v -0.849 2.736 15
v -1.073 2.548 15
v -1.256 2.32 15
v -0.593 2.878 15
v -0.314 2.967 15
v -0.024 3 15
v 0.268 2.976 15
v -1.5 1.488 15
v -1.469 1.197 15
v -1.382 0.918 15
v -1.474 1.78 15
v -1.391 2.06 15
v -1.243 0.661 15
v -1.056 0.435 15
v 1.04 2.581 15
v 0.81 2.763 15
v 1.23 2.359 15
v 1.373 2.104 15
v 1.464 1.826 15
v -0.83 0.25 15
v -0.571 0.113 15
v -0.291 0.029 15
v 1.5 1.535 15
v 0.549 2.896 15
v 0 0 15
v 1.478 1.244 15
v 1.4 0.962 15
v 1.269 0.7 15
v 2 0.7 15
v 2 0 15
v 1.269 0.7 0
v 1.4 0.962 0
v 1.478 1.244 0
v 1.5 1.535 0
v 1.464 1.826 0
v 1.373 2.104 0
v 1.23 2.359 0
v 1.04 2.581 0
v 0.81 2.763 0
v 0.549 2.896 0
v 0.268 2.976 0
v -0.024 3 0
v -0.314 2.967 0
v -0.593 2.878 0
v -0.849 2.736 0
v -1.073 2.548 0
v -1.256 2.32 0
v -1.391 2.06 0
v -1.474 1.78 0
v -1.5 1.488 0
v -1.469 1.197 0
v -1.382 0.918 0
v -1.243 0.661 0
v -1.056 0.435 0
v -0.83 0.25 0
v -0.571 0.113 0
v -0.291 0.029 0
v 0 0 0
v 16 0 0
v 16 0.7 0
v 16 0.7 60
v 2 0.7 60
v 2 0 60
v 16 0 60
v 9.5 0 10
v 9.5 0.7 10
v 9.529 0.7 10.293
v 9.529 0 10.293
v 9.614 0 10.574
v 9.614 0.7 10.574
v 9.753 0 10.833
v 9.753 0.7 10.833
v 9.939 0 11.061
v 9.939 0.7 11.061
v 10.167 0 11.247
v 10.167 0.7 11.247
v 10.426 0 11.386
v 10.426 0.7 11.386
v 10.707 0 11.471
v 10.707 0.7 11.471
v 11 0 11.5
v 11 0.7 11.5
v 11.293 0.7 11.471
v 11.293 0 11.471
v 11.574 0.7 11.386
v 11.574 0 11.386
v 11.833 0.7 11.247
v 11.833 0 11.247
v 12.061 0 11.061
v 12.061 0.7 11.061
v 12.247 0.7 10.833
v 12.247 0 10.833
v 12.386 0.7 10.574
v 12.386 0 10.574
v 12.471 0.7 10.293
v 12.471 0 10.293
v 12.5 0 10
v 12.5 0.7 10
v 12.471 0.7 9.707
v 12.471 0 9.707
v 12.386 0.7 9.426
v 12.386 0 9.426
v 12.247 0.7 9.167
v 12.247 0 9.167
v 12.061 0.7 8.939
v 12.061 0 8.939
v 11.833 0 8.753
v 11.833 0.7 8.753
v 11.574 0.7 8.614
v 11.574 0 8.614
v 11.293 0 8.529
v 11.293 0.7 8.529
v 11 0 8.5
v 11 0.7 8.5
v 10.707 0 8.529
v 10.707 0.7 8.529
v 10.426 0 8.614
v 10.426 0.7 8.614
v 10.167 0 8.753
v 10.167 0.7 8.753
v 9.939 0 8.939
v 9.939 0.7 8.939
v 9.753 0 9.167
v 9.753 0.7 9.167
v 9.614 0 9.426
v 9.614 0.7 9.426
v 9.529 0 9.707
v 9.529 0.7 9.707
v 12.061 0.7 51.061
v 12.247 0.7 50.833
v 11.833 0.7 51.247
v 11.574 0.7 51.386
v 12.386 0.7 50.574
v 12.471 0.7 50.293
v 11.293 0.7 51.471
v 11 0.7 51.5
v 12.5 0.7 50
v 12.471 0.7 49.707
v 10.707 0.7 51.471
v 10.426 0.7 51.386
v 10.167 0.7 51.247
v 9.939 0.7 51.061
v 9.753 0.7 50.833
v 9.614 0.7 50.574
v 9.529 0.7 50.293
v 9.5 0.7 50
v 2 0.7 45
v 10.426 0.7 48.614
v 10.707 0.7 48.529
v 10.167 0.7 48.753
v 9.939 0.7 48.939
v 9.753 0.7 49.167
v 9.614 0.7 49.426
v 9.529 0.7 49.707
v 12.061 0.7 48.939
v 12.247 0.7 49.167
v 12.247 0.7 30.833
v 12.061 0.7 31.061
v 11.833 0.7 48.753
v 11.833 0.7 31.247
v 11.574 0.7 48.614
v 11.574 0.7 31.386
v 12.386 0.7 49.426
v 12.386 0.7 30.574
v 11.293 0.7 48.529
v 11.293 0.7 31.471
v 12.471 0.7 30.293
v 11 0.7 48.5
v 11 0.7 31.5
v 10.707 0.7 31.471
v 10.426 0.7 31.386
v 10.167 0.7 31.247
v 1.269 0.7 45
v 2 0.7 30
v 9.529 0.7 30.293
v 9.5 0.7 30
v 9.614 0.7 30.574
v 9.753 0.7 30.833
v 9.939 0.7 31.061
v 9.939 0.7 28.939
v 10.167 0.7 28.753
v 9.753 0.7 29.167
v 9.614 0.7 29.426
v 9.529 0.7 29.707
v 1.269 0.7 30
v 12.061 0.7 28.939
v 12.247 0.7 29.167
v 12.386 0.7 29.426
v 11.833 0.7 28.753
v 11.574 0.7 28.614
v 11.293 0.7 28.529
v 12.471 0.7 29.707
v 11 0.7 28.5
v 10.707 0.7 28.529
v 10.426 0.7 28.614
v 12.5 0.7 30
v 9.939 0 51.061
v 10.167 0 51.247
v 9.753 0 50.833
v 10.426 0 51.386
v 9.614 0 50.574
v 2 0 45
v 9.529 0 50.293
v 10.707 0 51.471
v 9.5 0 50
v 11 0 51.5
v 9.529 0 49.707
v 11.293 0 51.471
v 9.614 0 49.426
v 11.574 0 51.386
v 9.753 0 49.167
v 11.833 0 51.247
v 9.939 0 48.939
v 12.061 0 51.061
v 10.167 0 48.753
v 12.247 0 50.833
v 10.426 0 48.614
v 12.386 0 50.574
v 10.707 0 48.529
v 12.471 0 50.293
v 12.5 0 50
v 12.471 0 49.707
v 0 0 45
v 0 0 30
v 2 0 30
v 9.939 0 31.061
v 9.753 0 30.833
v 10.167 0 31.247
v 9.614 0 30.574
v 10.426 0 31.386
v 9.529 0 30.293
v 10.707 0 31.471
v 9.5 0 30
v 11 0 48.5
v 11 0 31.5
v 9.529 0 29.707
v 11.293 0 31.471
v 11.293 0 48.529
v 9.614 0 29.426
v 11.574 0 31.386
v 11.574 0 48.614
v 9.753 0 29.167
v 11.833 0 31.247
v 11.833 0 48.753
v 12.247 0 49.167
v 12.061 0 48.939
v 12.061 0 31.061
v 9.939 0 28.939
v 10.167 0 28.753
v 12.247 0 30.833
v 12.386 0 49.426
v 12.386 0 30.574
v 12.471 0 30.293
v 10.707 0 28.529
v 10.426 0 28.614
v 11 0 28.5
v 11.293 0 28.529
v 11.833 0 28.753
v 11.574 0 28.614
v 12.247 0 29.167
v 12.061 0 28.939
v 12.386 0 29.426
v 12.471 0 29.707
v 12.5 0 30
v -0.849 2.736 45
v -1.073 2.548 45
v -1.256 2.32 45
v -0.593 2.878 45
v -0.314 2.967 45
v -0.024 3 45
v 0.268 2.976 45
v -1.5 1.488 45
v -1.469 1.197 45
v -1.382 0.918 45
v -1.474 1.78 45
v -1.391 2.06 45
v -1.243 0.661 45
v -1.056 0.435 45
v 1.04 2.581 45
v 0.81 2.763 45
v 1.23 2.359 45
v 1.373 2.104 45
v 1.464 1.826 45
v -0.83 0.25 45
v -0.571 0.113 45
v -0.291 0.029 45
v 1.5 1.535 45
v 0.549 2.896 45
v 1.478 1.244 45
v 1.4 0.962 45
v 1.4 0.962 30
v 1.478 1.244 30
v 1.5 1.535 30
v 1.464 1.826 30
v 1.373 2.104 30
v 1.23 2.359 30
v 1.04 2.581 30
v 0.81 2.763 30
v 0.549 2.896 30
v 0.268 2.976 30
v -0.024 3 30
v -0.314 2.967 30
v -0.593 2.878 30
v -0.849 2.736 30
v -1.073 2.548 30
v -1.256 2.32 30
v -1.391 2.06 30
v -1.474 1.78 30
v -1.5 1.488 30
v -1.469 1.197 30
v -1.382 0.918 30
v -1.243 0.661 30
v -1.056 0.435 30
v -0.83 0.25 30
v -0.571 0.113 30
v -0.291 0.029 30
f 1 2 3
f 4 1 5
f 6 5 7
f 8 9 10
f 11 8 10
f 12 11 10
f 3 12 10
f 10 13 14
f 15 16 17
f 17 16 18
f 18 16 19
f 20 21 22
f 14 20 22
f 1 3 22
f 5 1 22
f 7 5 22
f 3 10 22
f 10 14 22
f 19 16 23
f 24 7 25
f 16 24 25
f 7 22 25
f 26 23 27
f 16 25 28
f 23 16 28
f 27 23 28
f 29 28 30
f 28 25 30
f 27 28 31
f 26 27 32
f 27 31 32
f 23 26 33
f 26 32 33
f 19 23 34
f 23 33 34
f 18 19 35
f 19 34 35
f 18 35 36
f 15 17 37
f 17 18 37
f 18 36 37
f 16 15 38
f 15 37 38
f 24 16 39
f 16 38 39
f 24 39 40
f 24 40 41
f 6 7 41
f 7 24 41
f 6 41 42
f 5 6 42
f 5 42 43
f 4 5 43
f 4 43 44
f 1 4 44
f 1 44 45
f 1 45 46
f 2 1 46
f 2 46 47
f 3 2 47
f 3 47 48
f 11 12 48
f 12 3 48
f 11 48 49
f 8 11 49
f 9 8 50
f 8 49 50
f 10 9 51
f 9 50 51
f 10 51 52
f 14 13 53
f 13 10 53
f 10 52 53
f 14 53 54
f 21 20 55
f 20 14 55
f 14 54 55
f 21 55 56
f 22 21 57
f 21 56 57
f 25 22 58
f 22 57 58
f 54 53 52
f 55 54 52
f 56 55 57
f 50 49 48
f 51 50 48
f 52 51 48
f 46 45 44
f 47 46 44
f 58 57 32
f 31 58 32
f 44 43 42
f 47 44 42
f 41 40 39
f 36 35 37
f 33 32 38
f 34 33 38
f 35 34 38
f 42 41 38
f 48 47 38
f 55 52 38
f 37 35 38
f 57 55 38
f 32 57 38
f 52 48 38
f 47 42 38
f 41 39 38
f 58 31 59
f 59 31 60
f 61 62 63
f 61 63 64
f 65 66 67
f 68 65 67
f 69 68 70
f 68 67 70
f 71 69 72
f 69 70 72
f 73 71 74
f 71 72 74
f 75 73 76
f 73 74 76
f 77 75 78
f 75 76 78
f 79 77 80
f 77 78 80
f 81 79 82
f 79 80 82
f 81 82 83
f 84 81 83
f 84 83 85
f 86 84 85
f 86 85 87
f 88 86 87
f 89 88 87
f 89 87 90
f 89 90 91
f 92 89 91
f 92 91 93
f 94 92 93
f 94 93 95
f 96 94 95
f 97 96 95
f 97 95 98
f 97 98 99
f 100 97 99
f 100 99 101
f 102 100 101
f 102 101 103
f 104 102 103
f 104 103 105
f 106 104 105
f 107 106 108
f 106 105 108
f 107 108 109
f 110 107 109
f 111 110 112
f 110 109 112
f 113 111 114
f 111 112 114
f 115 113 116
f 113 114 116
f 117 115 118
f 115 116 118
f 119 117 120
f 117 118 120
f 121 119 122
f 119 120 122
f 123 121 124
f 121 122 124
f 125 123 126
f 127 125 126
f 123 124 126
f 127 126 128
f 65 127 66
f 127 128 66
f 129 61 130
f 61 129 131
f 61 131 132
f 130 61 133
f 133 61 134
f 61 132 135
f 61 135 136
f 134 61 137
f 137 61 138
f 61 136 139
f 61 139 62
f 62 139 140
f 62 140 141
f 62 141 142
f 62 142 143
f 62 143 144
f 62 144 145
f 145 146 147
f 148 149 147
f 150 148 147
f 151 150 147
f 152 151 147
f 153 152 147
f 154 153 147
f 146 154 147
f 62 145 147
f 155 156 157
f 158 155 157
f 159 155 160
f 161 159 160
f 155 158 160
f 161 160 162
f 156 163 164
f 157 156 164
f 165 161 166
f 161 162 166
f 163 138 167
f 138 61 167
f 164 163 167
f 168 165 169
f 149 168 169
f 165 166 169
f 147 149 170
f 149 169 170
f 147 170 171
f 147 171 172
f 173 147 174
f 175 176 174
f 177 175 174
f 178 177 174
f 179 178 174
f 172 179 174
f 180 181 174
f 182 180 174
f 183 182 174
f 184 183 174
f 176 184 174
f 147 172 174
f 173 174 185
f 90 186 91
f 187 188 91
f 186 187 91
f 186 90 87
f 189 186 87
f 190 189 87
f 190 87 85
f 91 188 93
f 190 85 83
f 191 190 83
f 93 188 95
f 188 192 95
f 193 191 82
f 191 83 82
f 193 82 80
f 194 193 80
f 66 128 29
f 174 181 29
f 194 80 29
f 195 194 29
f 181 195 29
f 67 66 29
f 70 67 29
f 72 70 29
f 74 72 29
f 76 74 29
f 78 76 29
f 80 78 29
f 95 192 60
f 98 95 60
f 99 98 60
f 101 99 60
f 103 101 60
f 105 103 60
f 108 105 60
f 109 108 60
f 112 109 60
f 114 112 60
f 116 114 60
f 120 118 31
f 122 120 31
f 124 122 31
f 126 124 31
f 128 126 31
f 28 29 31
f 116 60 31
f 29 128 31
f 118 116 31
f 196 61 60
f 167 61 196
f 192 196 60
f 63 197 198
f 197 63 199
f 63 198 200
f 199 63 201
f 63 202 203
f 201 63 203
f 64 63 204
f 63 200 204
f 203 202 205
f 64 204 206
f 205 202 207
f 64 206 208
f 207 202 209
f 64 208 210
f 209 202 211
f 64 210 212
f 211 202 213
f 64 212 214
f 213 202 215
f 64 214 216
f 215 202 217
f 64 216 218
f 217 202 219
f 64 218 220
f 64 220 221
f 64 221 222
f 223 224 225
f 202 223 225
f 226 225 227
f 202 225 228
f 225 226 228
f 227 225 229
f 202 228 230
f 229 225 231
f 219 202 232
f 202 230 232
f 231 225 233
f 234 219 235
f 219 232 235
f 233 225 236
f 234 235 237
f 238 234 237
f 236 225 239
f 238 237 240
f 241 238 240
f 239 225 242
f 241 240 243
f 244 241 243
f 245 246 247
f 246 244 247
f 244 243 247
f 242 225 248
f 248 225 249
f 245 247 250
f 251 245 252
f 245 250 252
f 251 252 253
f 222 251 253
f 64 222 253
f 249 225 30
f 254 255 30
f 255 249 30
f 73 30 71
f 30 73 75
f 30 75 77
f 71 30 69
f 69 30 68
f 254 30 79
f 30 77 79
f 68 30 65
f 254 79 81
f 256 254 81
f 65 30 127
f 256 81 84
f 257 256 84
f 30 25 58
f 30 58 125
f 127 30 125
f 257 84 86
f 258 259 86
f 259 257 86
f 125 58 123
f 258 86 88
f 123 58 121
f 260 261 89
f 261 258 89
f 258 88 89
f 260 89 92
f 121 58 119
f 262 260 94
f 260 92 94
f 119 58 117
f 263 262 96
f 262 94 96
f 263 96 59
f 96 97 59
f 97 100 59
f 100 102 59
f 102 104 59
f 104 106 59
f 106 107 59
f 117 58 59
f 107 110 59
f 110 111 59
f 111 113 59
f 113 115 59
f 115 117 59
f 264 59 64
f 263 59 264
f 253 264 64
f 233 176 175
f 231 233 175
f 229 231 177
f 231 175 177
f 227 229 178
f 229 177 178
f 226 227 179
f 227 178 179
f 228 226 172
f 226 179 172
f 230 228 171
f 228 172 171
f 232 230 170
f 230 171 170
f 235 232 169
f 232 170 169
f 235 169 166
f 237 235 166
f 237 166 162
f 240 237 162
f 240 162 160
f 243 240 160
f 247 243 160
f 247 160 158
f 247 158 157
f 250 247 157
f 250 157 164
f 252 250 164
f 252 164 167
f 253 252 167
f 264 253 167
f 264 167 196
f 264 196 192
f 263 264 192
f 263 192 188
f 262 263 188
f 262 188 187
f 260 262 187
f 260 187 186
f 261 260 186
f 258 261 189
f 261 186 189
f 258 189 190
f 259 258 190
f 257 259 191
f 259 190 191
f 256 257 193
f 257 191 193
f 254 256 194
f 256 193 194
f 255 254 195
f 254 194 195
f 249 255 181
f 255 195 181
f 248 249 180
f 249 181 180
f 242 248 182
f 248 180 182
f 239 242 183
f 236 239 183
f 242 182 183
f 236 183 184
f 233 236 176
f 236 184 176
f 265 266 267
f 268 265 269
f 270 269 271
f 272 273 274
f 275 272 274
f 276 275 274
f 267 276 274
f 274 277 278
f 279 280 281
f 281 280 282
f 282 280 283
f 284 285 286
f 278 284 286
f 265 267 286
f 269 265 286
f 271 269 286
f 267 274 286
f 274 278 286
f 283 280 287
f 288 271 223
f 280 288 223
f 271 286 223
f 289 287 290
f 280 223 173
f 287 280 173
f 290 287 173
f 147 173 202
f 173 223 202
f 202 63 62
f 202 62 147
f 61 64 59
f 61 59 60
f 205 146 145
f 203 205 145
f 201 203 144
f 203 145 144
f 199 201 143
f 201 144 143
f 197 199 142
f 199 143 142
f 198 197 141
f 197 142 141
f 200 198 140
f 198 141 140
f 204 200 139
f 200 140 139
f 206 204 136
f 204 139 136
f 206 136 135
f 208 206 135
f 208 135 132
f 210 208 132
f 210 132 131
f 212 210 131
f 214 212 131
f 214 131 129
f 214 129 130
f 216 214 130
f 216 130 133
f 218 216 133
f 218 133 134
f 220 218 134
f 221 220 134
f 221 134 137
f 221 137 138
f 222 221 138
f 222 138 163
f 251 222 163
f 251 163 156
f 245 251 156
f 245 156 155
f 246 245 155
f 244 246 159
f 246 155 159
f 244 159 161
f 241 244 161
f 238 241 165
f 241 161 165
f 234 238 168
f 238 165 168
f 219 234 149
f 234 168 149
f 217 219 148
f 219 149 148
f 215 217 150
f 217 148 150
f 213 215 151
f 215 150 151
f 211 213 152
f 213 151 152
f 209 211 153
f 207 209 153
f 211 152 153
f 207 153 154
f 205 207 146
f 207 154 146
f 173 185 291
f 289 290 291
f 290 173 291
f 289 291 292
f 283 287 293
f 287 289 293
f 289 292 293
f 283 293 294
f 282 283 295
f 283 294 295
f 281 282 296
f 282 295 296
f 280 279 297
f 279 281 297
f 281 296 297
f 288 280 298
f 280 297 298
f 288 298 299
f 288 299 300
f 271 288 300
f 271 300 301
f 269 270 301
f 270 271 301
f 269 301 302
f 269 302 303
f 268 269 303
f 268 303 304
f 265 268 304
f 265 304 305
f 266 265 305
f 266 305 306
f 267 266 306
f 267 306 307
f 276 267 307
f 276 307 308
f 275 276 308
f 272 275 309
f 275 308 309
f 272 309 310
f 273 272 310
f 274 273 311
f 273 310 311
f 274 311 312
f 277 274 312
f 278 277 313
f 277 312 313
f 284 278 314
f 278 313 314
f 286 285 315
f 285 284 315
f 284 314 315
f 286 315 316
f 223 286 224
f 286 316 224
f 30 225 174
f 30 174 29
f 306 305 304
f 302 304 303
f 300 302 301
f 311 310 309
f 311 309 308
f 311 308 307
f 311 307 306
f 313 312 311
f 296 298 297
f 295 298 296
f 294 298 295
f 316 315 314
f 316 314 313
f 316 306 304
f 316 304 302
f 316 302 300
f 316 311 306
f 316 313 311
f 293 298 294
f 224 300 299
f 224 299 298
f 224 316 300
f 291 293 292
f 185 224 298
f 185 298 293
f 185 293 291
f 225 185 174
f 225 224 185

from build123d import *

# Parameters (mm, degrees)
EXTRUSION1_DEPTH           = 60
EXTRUSION2_START           = -10
ESQUISSE2_W                = 7.046962448
ESQUISSE2_H                = 15
EXTRUSION2_DEPTH           = 73.139279043
R_P_TITION_LIN_AIRE1_COUNT = 2
R_P_TITION_LIN_AIRE1_PITCH = 30
ESQUISSE3_R                = 1.5
EXTRUSION3_DEPTH           = 63.139279043
R_P_TITION_LIN_AIRE2_COUNT = 3
R_P_TITION_LIN_AIRE2_PITCH = 20


with BuildPart() as part:
    # Esquisse1 → Extrusion1 (new body)
    with BuildSketch(Plane.XY):
        with BuildLine():
            Line((0, 0), (16, 0))
            Line((16, 0), (16, 0.7))
            Line((16, 0.7), (1.268857754, 0.7))
            ThreePointArc((1.268857754, 0.7), (-0.724568837, 2.813392554), (0, 0))
        make_face()
    extrude(amount=EXTRUSION1_DEPTH)

    # Esquisse2 → Extrusion2 (cut, through all)
    with BuildSketch(Plane(origin=(0, 0.7, 0), x_dir=(1, 0, 0), z_dir=(0, 1, 0)).offset(EXTRUSION2_START)):
        with Locations((-1.523481224, -52.5)):
            Rectangle(ESQUISSE2_W, ESQUISSE2_H)
    extrusion2 = extrude(amount=EXTRUSION2_DEPTH, mode=Mode.SUBTRACT)

    # Répétition linéaire1: Extrusion2 ×2
    with Locations(*[(0, 0, -i * R_P_TITION_LIN_AIRE1_PITCH) for i in range(1, R_P_TITION_LIN_AIRE1_COUNT)]):
        add(extrusion2, mode=Mode.SUBTRACT)

    # Esquisse3 → Extrusion3 (cut, through all)
    with BuildSketch(Plane(origin=(0, 0.7, 0), x_dir=(1, 0, 0), z_dir=(0, 1, 0))):
        with Locations(Location((11, -50, 0), (0, 0, 180))):
            Circle(ESQUISSE3_R)
    extrusion3 = extrude(amount=-EXTRUSION3_DEPTH, mode=Mode.SUBTRACT)

    # Répétition linéaire2: Extrusion3 ×3
    with Locations(*[(0, 0, -i * R_P_TITION_LIN_AIRE2_PITCH) for i in range(1, R_P_TITION_LIN_AIRE2_COUNT)]):
        add(extrusion3, mode=Mode.SUBTRACT)


solid = part.part
